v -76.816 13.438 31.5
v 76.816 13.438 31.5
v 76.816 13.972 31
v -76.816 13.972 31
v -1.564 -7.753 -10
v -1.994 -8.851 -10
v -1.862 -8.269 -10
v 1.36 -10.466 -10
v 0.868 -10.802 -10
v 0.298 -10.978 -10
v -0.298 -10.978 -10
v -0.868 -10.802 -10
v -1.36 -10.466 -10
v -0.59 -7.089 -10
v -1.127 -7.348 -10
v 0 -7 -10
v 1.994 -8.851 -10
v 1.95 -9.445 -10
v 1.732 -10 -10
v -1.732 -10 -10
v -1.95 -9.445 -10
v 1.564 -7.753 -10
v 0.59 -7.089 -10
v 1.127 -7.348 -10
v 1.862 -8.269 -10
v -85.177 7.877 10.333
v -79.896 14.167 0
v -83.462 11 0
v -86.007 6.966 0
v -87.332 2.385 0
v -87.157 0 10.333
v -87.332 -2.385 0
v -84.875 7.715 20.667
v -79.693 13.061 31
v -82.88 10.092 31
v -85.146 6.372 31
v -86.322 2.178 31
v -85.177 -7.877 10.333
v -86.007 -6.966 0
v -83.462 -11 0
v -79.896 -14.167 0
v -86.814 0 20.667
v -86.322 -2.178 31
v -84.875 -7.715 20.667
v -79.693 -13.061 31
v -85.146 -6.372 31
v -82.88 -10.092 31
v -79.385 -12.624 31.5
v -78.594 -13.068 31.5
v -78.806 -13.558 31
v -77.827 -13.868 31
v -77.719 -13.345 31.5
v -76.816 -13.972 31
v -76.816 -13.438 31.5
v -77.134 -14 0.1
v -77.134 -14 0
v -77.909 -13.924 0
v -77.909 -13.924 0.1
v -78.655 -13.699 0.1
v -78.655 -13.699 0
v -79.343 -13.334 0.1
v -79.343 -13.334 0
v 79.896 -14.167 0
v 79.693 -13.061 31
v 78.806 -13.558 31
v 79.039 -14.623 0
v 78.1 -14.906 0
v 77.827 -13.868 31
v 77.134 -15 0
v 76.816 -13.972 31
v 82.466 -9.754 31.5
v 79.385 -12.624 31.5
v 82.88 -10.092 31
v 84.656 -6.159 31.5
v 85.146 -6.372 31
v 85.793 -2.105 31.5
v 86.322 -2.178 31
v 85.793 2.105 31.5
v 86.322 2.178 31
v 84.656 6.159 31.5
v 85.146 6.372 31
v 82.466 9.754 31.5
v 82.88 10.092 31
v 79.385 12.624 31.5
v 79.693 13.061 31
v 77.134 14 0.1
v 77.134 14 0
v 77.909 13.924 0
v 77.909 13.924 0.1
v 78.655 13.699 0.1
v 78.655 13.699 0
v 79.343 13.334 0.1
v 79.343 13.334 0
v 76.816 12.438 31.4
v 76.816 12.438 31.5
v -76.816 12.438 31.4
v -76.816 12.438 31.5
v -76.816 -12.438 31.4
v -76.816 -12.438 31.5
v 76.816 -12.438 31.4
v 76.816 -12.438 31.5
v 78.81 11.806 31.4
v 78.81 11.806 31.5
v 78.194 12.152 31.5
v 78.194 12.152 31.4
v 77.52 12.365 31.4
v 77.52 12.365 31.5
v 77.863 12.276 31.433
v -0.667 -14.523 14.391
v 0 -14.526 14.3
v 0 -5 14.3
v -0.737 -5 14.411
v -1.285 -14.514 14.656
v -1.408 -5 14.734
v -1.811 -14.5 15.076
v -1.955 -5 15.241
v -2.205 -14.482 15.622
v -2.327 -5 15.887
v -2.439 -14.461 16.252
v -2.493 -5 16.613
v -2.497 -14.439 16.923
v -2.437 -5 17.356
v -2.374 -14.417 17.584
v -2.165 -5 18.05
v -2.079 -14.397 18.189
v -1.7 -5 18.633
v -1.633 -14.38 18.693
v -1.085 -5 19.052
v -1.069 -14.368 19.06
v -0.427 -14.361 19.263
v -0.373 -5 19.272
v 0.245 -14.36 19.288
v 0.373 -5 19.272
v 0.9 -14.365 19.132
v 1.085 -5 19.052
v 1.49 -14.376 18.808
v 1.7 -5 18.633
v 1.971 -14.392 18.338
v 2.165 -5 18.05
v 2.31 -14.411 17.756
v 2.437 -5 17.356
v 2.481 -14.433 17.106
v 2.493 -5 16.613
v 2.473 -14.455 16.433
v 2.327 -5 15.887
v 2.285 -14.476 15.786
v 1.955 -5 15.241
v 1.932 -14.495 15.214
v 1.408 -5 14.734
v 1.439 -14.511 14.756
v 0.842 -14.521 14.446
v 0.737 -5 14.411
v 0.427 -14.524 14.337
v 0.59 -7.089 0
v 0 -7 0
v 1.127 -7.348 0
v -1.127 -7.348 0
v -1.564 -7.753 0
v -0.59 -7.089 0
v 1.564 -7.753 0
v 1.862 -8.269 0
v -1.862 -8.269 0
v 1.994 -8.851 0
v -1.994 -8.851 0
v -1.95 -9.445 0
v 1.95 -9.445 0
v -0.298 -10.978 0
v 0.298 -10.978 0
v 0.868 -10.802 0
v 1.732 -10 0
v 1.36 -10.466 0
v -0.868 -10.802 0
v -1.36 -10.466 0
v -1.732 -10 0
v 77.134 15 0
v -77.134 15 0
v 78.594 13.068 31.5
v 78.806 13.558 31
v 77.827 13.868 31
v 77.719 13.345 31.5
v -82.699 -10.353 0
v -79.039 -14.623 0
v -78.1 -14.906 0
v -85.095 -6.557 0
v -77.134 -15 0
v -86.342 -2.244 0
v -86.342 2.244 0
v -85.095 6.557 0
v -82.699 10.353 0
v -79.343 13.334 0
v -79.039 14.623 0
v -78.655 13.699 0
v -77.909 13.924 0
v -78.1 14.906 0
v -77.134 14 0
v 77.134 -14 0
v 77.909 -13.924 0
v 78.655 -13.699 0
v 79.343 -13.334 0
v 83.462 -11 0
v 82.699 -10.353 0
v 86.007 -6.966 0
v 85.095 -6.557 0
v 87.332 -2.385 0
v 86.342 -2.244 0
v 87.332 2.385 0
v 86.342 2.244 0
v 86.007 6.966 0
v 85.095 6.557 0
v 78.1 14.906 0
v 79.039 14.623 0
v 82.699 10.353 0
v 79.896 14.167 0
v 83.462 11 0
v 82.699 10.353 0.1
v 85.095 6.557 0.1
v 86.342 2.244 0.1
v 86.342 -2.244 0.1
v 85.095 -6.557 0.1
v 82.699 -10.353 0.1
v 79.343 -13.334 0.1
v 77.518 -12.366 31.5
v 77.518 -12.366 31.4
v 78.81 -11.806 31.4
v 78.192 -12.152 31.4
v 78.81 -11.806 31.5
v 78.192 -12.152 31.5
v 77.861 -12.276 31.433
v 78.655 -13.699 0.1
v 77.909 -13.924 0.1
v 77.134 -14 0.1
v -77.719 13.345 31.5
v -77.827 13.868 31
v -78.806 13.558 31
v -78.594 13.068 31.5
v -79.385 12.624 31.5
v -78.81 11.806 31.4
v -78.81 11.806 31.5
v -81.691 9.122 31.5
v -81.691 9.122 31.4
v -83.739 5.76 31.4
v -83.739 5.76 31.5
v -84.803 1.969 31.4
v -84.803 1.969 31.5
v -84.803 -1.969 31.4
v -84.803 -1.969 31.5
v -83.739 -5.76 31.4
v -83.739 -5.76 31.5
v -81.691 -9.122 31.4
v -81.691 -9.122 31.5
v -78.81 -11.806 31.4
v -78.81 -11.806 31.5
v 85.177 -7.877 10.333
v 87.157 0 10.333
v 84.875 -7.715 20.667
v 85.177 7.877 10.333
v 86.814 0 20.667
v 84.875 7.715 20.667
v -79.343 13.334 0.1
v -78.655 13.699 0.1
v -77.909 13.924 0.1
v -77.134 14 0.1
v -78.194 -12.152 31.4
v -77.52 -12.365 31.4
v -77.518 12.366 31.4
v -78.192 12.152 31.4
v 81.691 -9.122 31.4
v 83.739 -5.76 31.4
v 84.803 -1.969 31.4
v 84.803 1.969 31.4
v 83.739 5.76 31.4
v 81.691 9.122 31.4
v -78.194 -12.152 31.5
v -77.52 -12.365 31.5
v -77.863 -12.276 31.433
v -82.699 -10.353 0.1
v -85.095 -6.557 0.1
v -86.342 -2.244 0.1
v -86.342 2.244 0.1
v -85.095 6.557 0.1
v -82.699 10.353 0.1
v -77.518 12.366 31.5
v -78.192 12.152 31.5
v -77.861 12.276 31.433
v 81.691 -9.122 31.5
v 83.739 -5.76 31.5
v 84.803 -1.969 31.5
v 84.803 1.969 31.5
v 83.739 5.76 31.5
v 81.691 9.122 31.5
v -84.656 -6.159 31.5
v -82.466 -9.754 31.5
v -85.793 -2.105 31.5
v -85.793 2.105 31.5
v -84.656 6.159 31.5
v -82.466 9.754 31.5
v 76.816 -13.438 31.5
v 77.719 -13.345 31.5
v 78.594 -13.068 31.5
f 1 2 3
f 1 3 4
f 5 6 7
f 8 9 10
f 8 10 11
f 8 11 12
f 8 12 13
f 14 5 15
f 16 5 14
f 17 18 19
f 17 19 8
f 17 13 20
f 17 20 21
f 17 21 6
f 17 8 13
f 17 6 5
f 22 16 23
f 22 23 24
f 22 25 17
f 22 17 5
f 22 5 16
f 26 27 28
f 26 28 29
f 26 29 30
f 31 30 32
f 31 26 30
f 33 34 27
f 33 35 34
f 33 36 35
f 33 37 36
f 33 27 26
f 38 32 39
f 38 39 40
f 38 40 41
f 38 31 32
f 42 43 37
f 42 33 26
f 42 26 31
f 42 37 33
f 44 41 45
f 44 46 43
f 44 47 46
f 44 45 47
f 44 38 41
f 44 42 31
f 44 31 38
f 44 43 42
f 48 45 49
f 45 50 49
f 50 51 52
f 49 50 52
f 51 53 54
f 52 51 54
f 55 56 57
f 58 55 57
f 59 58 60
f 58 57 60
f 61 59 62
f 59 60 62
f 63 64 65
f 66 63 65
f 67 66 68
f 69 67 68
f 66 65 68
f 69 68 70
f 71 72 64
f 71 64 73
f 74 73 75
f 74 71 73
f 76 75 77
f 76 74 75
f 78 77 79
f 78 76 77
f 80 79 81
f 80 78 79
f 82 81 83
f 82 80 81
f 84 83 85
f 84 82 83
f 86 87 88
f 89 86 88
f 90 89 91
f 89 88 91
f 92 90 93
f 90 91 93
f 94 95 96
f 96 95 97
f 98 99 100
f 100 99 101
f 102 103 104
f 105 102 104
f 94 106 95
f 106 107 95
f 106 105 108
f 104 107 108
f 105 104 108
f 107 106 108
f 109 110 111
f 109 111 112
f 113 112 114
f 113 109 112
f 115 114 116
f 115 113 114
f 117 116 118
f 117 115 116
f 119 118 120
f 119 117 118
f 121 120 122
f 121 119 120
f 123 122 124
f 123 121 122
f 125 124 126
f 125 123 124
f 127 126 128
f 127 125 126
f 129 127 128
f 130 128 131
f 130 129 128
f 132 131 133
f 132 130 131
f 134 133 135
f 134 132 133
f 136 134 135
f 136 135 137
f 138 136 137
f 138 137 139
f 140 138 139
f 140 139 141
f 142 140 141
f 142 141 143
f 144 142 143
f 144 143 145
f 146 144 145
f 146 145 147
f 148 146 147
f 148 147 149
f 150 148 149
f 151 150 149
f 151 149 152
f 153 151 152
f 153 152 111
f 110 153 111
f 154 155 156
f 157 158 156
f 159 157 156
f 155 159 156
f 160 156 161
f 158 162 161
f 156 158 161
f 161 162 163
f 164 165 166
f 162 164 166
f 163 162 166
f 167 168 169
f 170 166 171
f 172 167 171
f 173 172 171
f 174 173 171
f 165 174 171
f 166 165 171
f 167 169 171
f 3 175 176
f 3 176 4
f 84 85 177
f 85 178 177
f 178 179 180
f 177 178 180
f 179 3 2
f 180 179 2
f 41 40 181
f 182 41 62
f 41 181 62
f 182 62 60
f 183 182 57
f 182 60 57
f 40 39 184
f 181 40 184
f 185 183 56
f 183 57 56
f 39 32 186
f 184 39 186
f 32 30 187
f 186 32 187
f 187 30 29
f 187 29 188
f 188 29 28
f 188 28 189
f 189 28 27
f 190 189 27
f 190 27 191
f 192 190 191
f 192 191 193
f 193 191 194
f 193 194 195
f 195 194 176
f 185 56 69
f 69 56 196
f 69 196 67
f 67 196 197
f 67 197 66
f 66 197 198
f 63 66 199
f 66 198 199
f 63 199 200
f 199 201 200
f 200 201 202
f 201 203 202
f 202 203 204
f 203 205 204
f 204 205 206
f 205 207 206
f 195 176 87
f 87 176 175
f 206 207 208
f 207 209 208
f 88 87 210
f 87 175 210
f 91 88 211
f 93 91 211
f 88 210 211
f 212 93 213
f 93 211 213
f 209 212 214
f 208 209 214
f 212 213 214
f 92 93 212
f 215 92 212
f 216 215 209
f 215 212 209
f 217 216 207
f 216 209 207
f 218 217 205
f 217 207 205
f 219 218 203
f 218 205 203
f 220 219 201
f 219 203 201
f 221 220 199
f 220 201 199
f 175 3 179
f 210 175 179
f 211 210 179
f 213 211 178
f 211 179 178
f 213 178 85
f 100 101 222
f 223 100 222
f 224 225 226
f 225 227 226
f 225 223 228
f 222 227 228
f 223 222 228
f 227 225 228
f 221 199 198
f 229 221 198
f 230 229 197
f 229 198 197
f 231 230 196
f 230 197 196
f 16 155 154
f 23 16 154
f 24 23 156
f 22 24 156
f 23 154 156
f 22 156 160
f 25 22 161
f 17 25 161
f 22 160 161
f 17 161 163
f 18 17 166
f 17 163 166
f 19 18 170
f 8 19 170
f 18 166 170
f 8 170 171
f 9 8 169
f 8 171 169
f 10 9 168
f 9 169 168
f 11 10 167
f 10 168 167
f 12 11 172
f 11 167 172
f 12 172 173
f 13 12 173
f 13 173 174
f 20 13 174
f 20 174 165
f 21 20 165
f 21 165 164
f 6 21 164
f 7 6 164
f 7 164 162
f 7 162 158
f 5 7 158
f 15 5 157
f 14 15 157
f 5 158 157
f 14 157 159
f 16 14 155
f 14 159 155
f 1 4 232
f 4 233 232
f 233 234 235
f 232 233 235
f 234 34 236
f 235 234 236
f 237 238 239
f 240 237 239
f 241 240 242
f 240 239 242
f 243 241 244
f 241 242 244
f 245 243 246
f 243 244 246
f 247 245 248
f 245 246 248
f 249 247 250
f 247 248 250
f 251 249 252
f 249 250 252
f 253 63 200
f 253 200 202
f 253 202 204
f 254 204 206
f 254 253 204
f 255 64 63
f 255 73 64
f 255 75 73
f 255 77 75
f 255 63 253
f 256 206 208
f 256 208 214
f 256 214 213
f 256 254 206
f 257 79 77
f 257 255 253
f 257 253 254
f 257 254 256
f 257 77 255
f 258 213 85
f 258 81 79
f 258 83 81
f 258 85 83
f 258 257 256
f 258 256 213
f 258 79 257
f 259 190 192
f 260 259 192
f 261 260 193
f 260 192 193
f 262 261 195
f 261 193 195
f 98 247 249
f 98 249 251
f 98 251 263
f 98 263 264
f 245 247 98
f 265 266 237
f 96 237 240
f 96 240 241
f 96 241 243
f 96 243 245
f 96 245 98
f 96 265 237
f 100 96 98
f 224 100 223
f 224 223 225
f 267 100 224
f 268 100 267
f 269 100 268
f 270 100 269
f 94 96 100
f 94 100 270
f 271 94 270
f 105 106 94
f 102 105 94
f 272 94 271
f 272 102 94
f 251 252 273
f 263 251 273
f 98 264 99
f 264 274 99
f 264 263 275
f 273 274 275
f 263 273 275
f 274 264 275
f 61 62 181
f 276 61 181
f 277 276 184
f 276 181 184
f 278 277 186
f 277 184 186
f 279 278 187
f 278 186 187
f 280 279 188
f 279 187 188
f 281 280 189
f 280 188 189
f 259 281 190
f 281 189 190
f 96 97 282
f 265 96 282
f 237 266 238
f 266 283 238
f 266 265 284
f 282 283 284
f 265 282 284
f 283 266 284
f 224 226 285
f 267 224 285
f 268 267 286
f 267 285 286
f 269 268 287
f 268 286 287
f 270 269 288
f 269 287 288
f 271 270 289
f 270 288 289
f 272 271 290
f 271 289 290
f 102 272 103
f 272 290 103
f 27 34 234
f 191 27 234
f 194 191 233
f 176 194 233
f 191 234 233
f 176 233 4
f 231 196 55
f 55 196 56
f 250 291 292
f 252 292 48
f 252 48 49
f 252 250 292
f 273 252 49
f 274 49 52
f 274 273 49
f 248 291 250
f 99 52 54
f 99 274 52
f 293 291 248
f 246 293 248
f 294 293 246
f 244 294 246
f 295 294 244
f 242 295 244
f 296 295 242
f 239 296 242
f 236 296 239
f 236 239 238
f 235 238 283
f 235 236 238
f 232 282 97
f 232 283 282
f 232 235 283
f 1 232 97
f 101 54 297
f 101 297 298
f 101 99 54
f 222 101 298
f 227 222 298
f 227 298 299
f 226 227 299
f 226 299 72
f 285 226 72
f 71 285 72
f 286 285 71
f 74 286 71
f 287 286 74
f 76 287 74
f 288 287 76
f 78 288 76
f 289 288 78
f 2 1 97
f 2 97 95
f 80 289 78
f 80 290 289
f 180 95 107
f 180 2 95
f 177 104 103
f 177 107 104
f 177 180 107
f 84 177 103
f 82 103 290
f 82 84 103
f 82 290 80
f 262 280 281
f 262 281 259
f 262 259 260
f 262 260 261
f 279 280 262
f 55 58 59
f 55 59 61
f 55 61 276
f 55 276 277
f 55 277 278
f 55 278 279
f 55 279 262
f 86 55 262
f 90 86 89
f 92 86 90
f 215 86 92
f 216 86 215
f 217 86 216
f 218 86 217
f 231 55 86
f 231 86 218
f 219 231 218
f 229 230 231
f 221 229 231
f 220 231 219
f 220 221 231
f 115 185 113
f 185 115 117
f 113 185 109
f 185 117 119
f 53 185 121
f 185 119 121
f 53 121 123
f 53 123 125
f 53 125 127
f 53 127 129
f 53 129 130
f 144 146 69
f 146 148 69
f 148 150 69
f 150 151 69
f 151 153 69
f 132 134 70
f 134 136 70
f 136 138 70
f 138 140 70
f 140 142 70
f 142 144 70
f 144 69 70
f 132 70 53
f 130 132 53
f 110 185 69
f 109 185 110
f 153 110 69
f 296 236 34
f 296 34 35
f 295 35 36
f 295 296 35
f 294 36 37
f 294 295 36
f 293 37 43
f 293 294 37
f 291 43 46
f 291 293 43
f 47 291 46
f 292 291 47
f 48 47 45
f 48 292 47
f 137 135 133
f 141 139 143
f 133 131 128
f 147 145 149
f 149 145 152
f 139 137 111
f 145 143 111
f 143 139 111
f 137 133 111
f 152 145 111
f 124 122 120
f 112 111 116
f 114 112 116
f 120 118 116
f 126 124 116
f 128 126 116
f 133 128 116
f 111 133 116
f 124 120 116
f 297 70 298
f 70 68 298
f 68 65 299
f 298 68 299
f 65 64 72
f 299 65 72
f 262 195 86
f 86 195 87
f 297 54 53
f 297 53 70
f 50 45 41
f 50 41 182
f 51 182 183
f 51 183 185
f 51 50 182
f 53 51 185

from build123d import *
from OCP.BRepFilletAPI import BRepFilletAPI_MakeChamfer

# Parameters (mm, degrees)
BOSS_EXTRUDE1_DEPTH = 31.5
BOSS_EXTRUDE1_TAPER = 1.9
FILLET1_R           = 5
CHAMFER2_SIZE       = 0.5
CHAMFER2_SIZE2      = 0.517440306
CHAMFER2_SIZE2_2    = 0.518340503
SKETCH2_R           = 2
BOSS_EXTRUDE2_DEPTH = 10
CUT_EXTRUDE2_DEPTH  = 0.1
CUT_EXTRUDE3_DEPTH  = 0.1
SKETCH5_R           = 2.5
CUT_EXTRUDE4_DEPTH  = 10


with BuildPart() as part:
    # Sketch1 → Boss-Extrude1 (new body)
    with BuildSketch(Plane.XY):
        with BuildLine():
            ThreePointArc((-78.5, 15), (-87.5, 0), (-78.5, -15))
            Line((-78.5, -15), (78.5, -15))
            ThreePointArc((78.5, -15), (87.5, 0), (78.5, 15))
            Line((78.5, 15), (-78.5, 15))
        make_face()
    extrude(amount=BOSS_EXTRUDE1_DEPTH, taper=BOSS_EXTRUDE1_TAPER)

    # Fillet1
    fillet1_edges = [part.edges().sort_by_distance(p)[0] for p in [
        (78.368295463, -14.477518375, 15.750009445),
        (-78.368295463, -14.477518375, 15.750009445),
        (-78.368295463, 14.477518375, 15.750009445),
        (78.368295463, 14.477518375, 15.750009445),
    ]]
    fillet(fillet1_edges, radius=FILLET1_R)

    # Chamfer2: one chamfer whose edges measure the first distance from different faces: ONE call of the kernel's chamfer builder (chamfer() names one face for all edges)
    chamfer2_edges_1 = [part.edges().sort_by_distance(p)[0] for p in [
        (86.455037377, 0, 31.5),
    ]]
    chamfer2_side_1 = [part.faces().sort_by_distance(p)[0] for p in [
        (86.977518688, 0, 15.75),
    ]]
    chamfer2_edges_2 = [part.edges().sort_by_distance(p)[0] for p in [
        (78.320821147, 13.721567571, 31.5),
    ]]
    chamfer2_side_2 = [part.faces().sort_by_distance(p)[0] for p in [
        (78.449460209, 14.254751063, 15.755250867),
    ]]
    chamfer2_edges_3 = [part.edges().sort_by_distance(p)[0] for p in [
        (78.320821147, -13.721567571, 31.5),
    ]]
    chamfer2_side_3 = [part.faces().sort_by_distance(p)[0] for p in [
        (78.449460207, -14.254751054, 15.755251143),
    ]]
    chamfer2_edges_4 = [part.edges().sort_by_distance(p)[0] for p in [
        (0, 13.955037377, 31.5),
    ]]
    chamfer2_side_4 = [part.faces().sort_by_distance(p)[0] for p in [
        (0, 14.477883921, 15.738990209),
    ]]
    chamfer2_edges_5 = [part.edges().sort_by_distance(p)[0] for p in [
        (0, -13.955037377, 31.5),
    ]]
    chamfer2_side_5 = [part.faces().sort_by_distance(p)[0] for p in [
        (0, -14.477883921, 15.738990209),
    ]]
    chamfer2_edges_6 = [part.edges().sort_by_distance(p)[0] for p in [
        (-78.320821147, 13.721567571, 31.5),
    ]]
    chamfer2_side_6 = [part.faces().sort_by_distance(p)[0] for p in [
        (-78.449460209, 14.254751063, 15.755250867),
    ]]
    chamfer2_edges_7 = [part.edges().sort_by_distance(p)[0] for p in [
        (-78.320821147, -13.721567571, 31.5),
    ]]
    chamfer2_side_7 = [part.faces().sort_by_distance(p)[0] for p in [
        (-78.449460209, -14.254751063, 15.755250867),
    ]]
    chamfer2_edges_8 = [part.edges().sort_by_distance(p)[0] for p in [
        (-86.455037377, 0, 31.5),
    ]]
    chamfer2_side_8 = [part.faces().sort_by_distance(p)[0] for p in [
        (-86.977518688, 0, 15.75),
    ]]
    chamfer2 = BRepFilletAPI_MakeChamfer(part.part.solid().wrapped)
    for e in chamfer2_edges_1:
        chamfer2.Add(CHAMFER2_SIZE, CHAMFER2_SIZE2, e.wrapped, chamfer2_side_1[0].wrapped)  # the first distance lies on this face
    for e in chamfer2_edges_2:
        chamfer2.Add(CHAMFER2_SIZE, CHAMFER2_SIZE2_2, e.wrapped, chamfer2_side_2[0].wrapped)  # the first distance lies on this face
    for e in chamfer2_edges_3:
        chamfer2.Add(CHAMFER2_SIZE, CHAMFER2_SIZE2_2, e.wrapped, chamfer2_side_3[0].wrapped)  # the first distance lies on this face
    for e in chamfer2_edges_4:
        chamfer2.Add(CHAMFER2_SIZE, CHAMFER2_SIZE2, e.wrapped, chamfer2_side_4[0].wrapped)  # the first distance lies on this face
    for e in chamfer2_edges_5:
        chamfer2.Add(CHAMFER2_SIZE, CHAMFER2_SIZE2, e.wrapped, chamfer2_side_5[0].wrapped)  # the first distance lies on this face
    for e in chamfer2_edges_6:
        chamfer2.Add(CHAMFER2_SIZE, CHAMFER2_SIZE2_2, e.wrapped, chamfer2_side_6[0].wrapped)  # the first distance lies on this face
    for e in chamfer2_edges_7:
        chamfer2.Add(CHAMFER2_SIZE, CHAMFER2_SIZE2_2, e.wrapped, chamfer2_side_7[0].wrapped)  # the first distance lies on this face
    for e in chamfer2_edges_8:
        chamfer2.Add(CHAMFER2_SIZE, CHAMFER2_SIZE2, e.wrapped, chamfer2_side_8[0].wrapped)  # the first distance lies on this face
    add(Compound.cast(chamfer2.Shape()), mode=Mode.REPLACE)

    # Sketch2 → Boss-Extrude2 (add)
    with BuildSketch(Plane(origin=(0, 0, 0), x_dir=(1, 0, 0), z_dir=(0, 0, -1))):
        with Locations(Location((0, 9, 0), (0, 0, 270))):
            Circle(SKETCH2_R)
    extrude(amount=BOSS_EXTRUDE2_DEPTH)

    # Sketch4 → Cut-Extrude2 (cut)
    with BuildSketch(Plane(origin=(0, 0, 0), x_dir=(1, 0, 0), z_dir=(0, 0, -1))):
        with BuildLine():
            Line((77.134085725, 14), (-77.13407836, 14))
            ThreePointArc((-77.13407836, 14), (-78.28785125, 13.829871561), (-79.343405855, 13.333948136))
            ThreePointArc((-79.343405855, 13.333948136), (-86.5, 0), (-79.343405855, -13.333948136))
            ThreePointArc((-79.343405855, -13.333948136), (-78.287854776, -13.829870498), (-77.134085725, -14))
            Line((-77.134085725, -14), (77.13407836, -14))
            ThreePointArc((77.13407836, -14), (78.28785125, -13.829871561), (79.343405855, -13.333948136))
            ThreePointArc((79.343405855, -13.333948136), (86.5, -3.683e-06), (79.343411993, 13.333944065))
            ThreePointArc((79.343411993, 13.333944065), (78.287858302, 13.829869435), (77.134085725, 14))
        make_face()
    extrude(amount=-CUT_EXTRUDE2_DEPTH, mode=Mode.SUBTRACT)


with BuildPart() as cut_extrude2_piece_1:
    # of the separate pieces the step leaves, piece 1, a body of its own (cut_extrude2_pieces)
    add(part.part.solids().sort_by_distance((76.816448619, 13.971614966, 31.000274892))[0])

    # Sketch3 → Cut-Extrude3 (cut)
    with BuildSketch(Plane.XY.offset(31.5)):
        with BuildLine():
            Line((-76.816443267, -12.437597071), (76.816344015, -12.437597076))
            add(Edge.make_bspline(
                [(76.816344015, -12.437597076), (76.994001702, -12.437579443), (77.169987293, -12.423992087), (77.51868719, -12.370269587), (77.692266942, -12.329673515), (78.198608665, -12.169572794), (78.519150863, -12.010927613), (78.809753873, -11.806447381)],
                knots=[0, 0, 0, 0, 0.25, 0.25, 0.5, 0.5, 1, 1, 1, 1], degree=3))
            ThreePointArc((78.809753873, -11.806447381), (84.937597071, -4.9626e-05), (78.80983504, 11.806390259))
            add(Edge.make_bspline(
                [(78.80983504, 11.806390259), (78.664544058, 11.908629119), (78.512810207, 11.998808845), (78.196737684, 12.155575821), (78.031425993, 12.222284265), (77.525213328, 12.382792579), (77.171777297, 12.437551746), (76.816443267, 12.437597071)],
                knots=[0, 0, 0, 0, 0.25, 0.25, 0.5, 0.5, 1, 1, 1, 1], degree=3))
            Line((76.816443267, 12.437597071), (-76.816344015, 12.437597076))
            add(Edge.make_bspline(
                [(-76.816344015, 12.437597076), (-76.994001702, 12.437579443), (-77.169987293, 12.423992087), (-77.51868719, 12.370269587), (-77.692266942, 12.329673515), (-78.198608665, 12.169572794), (-78.519150863, 12.010927613), (-78.809753873, 11.806447381)],
                knots=[0, 0, 0, 0, 0.25, 0.25, 0.5, 0.5, 1, 1, 1, 1], degree=3))
            ThreePointArc((-78.809753873, 11.806447381), (-84.937597071, 4.9626e-05), (-78.80983504, -11.806390259))
            add(Edge.make_bspline(
                [(-78.80983504, -11.806390259), (-78.664544058, -11.908629119), (-78.512810207, -11.998808845), (-78.196737684, -12.155575821), (-78.031425993, -12.222284265), (-77.525213328, -12.382792579), (-77.171777297, -12.437551746), (-76.816443267, -12.437597071)],
                knots=[0, 0, 0, 0, 0.25, 0.25, 0.5, 0.5, 1, 1, 1, 1], degree=3))
        make_face()
    extrude(amount=-CUT_EXTRUDE3_DEPTH, mode=Mode.SUBTRACT)

    # Sketch5 → Cut-Extrude4 (cut)
    with BuildSketch(Plane(origin=(0, -15, 0), x_dir=(1, 0, 0), z_dir=(0, 1, 0))):
        with Locations(Location((0, -16.8, 0), (0, 0, 90))):
            Circle(SKETCH5_R)
    extrude(amount=CUT_EXTRUDE4_DEPTH, mode=Mode.SUBTRACT)


with BuildPart() as cut_extrude2_piece_2:
    # of the separate pieces the step leaves, piece 2, a body of its own (cut_extrude2_pieces)
    add(part.part.solids().sort_by_distance((0, -7, 0))[0])


solid = Compound([cut_extrude2_piece_1.part, cut_extrude2_piece_2.part])
